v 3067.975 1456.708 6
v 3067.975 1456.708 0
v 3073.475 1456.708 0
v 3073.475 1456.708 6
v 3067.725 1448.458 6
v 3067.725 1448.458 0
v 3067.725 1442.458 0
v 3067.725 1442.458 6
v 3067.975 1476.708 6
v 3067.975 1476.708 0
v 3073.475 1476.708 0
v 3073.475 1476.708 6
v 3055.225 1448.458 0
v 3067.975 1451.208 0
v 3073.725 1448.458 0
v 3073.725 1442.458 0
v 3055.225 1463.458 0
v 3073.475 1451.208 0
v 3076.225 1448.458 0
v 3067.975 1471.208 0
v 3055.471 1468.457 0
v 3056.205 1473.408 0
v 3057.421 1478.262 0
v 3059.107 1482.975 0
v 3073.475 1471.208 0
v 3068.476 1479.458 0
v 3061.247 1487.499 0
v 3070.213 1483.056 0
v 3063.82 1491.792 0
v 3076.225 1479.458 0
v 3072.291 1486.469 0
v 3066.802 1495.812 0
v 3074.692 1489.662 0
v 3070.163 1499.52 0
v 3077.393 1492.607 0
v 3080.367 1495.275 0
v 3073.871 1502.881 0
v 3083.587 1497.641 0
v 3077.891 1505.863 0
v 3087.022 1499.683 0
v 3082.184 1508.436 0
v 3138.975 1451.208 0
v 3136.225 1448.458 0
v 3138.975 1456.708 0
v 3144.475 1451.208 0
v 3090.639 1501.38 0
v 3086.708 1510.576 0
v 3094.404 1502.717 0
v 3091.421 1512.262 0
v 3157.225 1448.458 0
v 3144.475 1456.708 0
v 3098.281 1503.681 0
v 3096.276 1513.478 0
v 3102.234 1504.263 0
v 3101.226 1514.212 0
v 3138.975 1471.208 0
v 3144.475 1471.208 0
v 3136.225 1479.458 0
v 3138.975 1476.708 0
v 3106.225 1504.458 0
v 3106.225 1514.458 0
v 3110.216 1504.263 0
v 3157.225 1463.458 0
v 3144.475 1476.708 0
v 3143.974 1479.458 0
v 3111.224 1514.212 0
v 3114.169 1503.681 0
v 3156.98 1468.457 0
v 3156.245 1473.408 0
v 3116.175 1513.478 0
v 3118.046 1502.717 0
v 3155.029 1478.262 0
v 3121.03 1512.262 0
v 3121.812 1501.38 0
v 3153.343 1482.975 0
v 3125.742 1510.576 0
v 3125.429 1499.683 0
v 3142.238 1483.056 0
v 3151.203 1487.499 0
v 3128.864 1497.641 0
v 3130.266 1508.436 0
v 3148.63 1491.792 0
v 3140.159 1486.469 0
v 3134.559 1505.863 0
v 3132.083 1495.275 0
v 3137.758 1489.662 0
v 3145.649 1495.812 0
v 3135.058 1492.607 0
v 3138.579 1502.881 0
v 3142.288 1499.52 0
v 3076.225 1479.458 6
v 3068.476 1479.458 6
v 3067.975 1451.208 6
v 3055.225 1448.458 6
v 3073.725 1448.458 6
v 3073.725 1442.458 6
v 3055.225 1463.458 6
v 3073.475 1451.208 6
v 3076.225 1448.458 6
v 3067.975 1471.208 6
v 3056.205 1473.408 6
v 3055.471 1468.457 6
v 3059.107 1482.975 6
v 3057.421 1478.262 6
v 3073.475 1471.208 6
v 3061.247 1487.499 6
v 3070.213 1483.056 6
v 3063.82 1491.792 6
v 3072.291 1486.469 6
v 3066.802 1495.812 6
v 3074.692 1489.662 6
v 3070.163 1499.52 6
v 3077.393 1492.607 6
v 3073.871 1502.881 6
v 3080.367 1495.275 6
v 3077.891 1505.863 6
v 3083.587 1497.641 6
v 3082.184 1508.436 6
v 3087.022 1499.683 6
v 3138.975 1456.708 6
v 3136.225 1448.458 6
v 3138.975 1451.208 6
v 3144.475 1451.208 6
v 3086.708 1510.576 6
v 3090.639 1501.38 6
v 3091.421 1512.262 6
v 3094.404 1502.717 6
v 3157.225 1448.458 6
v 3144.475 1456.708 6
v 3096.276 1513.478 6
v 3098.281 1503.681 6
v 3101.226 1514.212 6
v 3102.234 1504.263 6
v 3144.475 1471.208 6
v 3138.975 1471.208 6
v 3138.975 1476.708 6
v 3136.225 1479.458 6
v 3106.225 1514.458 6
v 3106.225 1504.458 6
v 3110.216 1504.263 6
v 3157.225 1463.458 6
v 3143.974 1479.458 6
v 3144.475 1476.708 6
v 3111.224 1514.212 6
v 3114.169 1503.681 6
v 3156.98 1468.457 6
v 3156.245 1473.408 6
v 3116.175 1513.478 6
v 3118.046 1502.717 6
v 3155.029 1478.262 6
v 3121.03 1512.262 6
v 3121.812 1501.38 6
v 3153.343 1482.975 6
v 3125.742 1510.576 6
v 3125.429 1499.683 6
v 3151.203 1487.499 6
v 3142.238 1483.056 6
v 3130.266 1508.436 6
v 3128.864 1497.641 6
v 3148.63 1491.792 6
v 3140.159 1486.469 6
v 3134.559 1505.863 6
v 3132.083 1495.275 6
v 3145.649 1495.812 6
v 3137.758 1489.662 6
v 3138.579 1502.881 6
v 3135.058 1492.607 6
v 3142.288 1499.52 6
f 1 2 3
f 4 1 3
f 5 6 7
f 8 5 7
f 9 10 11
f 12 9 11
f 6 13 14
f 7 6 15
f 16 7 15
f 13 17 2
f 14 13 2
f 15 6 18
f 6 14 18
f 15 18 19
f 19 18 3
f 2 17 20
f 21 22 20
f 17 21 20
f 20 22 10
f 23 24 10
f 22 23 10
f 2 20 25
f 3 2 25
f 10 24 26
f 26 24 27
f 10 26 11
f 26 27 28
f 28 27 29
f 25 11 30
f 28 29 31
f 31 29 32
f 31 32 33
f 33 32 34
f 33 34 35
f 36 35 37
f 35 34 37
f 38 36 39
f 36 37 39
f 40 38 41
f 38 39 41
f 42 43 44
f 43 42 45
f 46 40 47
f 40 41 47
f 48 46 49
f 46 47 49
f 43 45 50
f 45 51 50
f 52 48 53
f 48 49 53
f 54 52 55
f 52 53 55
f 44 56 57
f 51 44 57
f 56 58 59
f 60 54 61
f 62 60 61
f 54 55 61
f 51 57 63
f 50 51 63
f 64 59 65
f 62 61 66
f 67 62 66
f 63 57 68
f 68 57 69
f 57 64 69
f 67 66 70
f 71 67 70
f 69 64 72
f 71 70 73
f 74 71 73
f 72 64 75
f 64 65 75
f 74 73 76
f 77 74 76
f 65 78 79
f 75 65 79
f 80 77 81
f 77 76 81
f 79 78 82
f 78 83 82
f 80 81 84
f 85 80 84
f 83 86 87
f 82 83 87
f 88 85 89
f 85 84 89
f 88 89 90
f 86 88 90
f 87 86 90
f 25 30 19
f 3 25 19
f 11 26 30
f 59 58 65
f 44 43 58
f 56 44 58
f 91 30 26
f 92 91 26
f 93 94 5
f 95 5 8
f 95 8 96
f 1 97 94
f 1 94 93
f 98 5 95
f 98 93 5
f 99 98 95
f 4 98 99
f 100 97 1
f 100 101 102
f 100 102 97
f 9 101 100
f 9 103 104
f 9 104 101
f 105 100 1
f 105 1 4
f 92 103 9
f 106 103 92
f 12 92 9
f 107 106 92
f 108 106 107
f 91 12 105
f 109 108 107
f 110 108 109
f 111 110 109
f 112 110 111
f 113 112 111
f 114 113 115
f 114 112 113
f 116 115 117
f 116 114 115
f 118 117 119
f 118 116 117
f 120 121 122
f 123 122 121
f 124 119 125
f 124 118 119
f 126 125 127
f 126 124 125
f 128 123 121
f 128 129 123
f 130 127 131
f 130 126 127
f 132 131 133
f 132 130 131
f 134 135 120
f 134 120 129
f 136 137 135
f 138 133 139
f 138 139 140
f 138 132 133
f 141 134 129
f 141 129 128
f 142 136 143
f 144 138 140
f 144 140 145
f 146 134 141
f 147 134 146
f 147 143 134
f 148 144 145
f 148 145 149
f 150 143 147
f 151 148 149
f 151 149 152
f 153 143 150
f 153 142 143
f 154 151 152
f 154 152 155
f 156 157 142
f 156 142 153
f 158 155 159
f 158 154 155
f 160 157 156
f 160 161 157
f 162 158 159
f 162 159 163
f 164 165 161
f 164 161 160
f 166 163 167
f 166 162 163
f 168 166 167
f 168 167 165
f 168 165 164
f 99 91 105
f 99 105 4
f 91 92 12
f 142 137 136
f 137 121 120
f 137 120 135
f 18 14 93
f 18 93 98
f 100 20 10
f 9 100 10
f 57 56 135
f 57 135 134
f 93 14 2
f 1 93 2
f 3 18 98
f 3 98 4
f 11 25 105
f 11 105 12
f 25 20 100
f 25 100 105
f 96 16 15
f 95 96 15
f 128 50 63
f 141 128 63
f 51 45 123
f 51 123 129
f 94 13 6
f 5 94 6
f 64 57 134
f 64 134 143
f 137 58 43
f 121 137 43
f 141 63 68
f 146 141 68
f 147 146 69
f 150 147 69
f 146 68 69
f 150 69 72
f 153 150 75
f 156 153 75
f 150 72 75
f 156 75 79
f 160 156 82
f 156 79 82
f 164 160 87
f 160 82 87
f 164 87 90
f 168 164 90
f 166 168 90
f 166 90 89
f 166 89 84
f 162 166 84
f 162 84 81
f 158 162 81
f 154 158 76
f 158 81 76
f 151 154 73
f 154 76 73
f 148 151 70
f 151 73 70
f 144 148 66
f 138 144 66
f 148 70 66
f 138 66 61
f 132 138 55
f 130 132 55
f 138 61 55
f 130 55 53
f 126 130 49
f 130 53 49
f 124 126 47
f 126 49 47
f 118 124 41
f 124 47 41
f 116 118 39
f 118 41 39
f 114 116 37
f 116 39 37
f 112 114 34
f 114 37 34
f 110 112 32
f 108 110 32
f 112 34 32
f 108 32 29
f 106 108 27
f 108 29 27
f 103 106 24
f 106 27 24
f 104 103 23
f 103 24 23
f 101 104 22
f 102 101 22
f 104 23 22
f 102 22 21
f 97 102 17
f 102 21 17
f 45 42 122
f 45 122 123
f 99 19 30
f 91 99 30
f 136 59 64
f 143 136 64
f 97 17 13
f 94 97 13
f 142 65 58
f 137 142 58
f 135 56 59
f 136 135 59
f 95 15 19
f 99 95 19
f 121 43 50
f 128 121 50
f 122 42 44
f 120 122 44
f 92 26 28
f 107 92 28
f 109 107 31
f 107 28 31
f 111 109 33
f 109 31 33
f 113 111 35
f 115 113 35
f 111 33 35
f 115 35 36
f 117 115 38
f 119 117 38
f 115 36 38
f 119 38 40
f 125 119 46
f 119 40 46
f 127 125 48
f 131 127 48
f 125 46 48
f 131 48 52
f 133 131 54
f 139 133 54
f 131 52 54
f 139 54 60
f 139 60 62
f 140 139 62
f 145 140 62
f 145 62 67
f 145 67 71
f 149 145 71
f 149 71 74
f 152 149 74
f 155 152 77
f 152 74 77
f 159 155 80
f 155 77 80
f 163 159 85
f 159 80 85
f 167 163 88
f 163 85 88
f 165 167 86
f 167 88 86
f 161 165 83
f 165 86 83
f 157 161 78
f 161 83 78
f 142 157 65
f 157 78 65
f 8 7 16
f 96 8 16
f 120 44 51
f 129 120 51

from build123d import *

# Parameters (mm, degrees)
MODEL_W             = 5.5
MODEL_H             = 5.5
BOSS_EXTRUDE1_DEPTH = 6


with BuildPart() as part:
    # Model → Boss-Extrude1 (new body)
    with BuildSketch(Plane.XY):
        with BuildLine():
            Line((3055.225160199, 1463.457958964), (3055.225160199, 1448.457958964))
            Line((3055.225160199, 1448.457958964), (3067.725160199, 1448.457958964))
            Line((3067.725160199, 1448.457958964), (3067.725160199, 1442.457958964))
            Line((3067.725160199, 1442.457958964), (3073.725160199, 1442.457958964))
            Line((3073.725160199, 1442.457958964), (3073.725160199, 1448.457958964))
            Line((3073.725160199, 1448.457958964), (3076.225160199, 1448.457958964))
            Line((3076.225160199, 1448.457958964), (3076.225160199, 1479.457958964))
            Line((3076.225160199, 1479.457958964), (3068.475988022, 1479.457958964))
            ThreePointArc((3068.475988022, 1479.457958964), (3106.225160199, 1504.457958964), (3143.974332375, 1479.457958964))
            Line((3143.974332375, 1479.457958964), (3136.225160199, 1479.457958964))
            Line((3136.225160199, 1479.457958964), (3136.225160199, 1448.457958964))
            Line((3136.225160199, 1448.457958964), (3147.225160199, 1448.457958964))
            Line((3147.225160199, 1448.457958964), (3157.225160199, 1448.457958964))
            Line((3157.225160199, 1448.457958964), (3157.225160199, 1463.457958964))
            ThreePointArc((3157.225160199, 1463.457958964), (3106.225160199, 1514.457958964), (3055.225160199, 1463.457958964))
        make_face()
        with Locations((3141.725160199, 1453.957958964)):
            Rectangle(MODEL_W, MODEL_H, mode=Mode.SUBTRACT)
        with Locations((3141.725160199, 1473.957958964)):
            Rectangle(MODEL_W, MODEL_H, mode=Mode.SUBTRACT)
        with Locations((3070.725160199, 1453.957958964)):
            Rectangle(MODEL_W, MODEL_H, mode=Mode.SUBTRACT)
        with Locations((3070.725160199, 1473.957958964)):
            Rectangle(MODEL_W, MODEL_H, mode=Mode.SUBTRACT)
    extrude(amount=BOSS_EXTRUDE1_DEPTH)


solid = part.part
